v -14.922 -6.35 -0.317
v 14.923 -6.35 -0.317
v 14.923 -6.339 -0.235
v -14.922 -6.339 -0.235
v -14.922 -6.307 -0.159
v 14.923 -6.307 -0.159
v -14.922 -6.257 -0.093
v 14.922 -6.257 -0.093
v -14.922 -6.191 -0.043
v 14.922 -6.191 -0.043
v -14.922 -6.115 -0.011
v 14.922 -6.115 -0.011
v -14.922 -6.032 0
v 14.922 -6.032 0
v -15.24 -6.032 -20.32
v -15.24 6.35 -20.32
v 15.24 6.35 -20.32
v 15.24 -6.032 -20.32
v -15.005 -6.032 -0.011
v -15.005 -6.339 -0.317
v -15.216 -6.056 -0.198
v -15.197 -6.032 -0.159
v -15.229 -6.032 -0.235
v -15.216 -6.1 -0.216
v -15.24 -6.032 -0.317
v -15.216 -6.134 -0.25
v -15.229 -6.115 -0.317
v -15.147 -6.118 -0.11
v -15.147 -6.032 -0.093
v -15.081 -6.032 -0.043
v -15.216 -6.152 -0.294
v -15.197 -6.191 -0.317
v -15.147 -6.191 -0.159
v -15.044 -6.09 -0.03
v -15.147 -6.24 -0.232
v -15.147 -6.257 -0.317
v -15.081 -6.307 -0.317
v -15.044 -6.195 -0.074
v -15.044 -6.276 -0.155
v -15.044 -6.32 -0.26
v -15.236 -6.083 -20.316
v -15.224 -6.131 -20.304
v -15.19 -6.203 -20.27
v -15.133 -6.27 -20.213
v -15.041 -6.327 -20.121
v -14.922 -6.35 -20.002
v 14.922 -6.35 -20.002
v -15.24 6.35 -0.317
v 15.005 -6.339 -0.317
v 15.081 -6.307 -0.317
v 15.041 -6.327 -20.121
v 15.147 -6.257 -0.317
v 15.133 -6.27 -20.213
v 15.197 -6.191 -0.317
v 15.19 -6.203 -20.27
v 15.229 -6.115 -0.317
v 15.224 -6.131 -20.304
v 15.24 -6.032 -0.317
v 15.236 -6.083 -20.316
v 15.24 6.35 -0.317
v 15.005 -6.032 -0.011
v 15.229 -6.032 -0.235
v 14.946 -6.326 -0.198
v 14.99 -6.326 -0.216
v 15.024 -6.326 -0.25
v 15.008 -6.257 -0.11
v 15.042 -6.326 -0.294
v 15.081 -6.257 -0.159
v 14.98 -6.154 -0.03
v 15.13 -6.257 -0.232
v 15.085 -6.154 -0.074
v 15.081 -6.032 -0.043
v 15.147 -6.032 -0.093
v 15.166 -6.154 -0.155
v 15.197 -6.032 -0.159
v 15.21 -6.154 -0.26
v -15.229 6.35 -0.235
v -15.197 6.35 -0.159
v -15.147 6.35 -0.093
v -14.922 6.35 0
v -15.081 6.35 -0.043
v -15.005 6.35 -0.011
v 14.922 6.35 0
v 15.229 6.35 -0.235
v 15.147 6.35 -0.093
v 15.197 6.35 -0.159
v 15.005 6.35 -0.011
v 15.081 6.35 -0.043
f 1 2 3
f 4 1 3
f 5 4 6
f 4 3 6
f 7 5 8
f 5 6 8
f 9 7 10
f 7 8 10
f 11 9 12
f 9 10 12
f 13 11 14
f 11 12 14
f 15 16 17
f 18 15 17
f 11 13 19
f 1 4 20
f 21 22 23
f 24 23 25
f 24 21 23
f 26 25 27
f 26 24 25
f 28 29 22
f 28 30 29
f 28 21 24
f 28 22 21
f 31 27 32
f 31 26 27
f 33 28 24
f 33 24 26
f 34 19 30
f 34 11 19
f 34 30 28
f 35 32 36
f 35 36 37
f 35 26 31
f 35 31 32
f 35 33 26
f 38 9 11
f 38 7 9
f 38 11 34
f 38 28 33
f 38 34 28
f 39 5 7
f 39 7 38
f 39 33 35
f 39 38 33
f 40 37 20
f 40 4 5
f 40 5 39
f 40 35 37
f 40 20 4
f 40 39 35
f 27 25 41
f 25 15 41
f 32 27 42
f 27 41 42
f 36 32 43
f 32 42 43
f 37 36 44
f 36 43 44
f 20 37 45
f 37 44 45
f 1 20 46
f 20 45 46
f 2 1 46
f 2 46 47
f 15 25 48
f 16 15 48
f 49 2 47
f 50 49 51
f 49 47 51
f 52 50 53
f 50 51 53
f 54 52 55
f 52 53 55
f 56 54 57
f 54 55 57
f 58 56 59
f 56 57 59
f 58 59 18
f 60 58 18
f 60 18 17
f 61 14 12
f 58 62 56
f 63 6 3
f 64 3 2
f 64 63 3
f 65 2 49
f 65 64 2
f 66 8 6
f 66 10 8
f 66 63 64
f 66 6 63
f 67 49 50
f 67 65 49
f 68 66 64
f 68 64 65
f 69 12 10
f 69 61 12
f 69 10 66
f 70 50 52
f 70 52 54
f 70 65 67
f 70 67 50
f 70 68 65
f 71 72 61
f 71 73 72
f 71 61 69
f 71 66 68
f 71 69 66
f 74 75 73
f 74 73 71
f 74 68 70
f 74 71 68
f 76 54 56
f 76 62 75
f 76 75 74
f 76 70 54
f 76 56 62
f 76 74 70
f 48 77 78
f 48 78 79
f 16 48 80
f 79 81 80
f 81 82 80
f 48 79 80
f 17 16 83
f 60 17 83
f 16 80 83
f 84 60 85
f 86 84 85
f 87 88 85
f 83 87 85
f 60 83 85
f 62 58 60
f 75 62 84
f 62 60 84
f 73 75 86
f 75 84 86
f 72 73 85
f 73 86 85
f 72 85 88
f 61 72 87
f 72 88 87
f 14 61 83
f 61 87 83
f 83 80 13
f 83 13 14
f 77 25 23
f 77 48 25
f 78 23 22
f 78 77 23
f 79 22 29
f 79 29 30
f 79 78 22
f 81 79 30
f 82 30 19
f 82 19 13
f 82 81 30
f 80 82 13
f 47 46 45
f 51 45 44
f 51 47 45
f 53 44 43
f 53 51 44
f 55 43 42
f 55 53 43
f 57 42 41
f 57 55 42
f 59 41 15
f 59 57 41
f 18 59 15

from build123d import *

# Parameters (mm, degrees)
F0_W     = 30.48
F0_H     = 12.7
F1_DEPTH = 20.32
F2_R     = 0.3175


with BuildPart() as f1:
    # F0 (on Top) → F1 (new body)
    with BuildSketch(Plane.XY):
        Rectangle(F0_W, F0_H)
    extrude(amount=-F1_DEPTH)

    # F2
    f2_edges = [f1.edges().sort_by_distance(p)[0] for p in [
        (15.24, 0, 0),
        (0, -6.35, 0),
        (-15.24, 0, 0),
        (15.24, -6.35, -10.16),
        (0, -6.35, -20.32),
        (-15.24, -6.35, -10.16),
    ]]
    fillet(f2_edges, radius=F2_R)


solid = f1.part
